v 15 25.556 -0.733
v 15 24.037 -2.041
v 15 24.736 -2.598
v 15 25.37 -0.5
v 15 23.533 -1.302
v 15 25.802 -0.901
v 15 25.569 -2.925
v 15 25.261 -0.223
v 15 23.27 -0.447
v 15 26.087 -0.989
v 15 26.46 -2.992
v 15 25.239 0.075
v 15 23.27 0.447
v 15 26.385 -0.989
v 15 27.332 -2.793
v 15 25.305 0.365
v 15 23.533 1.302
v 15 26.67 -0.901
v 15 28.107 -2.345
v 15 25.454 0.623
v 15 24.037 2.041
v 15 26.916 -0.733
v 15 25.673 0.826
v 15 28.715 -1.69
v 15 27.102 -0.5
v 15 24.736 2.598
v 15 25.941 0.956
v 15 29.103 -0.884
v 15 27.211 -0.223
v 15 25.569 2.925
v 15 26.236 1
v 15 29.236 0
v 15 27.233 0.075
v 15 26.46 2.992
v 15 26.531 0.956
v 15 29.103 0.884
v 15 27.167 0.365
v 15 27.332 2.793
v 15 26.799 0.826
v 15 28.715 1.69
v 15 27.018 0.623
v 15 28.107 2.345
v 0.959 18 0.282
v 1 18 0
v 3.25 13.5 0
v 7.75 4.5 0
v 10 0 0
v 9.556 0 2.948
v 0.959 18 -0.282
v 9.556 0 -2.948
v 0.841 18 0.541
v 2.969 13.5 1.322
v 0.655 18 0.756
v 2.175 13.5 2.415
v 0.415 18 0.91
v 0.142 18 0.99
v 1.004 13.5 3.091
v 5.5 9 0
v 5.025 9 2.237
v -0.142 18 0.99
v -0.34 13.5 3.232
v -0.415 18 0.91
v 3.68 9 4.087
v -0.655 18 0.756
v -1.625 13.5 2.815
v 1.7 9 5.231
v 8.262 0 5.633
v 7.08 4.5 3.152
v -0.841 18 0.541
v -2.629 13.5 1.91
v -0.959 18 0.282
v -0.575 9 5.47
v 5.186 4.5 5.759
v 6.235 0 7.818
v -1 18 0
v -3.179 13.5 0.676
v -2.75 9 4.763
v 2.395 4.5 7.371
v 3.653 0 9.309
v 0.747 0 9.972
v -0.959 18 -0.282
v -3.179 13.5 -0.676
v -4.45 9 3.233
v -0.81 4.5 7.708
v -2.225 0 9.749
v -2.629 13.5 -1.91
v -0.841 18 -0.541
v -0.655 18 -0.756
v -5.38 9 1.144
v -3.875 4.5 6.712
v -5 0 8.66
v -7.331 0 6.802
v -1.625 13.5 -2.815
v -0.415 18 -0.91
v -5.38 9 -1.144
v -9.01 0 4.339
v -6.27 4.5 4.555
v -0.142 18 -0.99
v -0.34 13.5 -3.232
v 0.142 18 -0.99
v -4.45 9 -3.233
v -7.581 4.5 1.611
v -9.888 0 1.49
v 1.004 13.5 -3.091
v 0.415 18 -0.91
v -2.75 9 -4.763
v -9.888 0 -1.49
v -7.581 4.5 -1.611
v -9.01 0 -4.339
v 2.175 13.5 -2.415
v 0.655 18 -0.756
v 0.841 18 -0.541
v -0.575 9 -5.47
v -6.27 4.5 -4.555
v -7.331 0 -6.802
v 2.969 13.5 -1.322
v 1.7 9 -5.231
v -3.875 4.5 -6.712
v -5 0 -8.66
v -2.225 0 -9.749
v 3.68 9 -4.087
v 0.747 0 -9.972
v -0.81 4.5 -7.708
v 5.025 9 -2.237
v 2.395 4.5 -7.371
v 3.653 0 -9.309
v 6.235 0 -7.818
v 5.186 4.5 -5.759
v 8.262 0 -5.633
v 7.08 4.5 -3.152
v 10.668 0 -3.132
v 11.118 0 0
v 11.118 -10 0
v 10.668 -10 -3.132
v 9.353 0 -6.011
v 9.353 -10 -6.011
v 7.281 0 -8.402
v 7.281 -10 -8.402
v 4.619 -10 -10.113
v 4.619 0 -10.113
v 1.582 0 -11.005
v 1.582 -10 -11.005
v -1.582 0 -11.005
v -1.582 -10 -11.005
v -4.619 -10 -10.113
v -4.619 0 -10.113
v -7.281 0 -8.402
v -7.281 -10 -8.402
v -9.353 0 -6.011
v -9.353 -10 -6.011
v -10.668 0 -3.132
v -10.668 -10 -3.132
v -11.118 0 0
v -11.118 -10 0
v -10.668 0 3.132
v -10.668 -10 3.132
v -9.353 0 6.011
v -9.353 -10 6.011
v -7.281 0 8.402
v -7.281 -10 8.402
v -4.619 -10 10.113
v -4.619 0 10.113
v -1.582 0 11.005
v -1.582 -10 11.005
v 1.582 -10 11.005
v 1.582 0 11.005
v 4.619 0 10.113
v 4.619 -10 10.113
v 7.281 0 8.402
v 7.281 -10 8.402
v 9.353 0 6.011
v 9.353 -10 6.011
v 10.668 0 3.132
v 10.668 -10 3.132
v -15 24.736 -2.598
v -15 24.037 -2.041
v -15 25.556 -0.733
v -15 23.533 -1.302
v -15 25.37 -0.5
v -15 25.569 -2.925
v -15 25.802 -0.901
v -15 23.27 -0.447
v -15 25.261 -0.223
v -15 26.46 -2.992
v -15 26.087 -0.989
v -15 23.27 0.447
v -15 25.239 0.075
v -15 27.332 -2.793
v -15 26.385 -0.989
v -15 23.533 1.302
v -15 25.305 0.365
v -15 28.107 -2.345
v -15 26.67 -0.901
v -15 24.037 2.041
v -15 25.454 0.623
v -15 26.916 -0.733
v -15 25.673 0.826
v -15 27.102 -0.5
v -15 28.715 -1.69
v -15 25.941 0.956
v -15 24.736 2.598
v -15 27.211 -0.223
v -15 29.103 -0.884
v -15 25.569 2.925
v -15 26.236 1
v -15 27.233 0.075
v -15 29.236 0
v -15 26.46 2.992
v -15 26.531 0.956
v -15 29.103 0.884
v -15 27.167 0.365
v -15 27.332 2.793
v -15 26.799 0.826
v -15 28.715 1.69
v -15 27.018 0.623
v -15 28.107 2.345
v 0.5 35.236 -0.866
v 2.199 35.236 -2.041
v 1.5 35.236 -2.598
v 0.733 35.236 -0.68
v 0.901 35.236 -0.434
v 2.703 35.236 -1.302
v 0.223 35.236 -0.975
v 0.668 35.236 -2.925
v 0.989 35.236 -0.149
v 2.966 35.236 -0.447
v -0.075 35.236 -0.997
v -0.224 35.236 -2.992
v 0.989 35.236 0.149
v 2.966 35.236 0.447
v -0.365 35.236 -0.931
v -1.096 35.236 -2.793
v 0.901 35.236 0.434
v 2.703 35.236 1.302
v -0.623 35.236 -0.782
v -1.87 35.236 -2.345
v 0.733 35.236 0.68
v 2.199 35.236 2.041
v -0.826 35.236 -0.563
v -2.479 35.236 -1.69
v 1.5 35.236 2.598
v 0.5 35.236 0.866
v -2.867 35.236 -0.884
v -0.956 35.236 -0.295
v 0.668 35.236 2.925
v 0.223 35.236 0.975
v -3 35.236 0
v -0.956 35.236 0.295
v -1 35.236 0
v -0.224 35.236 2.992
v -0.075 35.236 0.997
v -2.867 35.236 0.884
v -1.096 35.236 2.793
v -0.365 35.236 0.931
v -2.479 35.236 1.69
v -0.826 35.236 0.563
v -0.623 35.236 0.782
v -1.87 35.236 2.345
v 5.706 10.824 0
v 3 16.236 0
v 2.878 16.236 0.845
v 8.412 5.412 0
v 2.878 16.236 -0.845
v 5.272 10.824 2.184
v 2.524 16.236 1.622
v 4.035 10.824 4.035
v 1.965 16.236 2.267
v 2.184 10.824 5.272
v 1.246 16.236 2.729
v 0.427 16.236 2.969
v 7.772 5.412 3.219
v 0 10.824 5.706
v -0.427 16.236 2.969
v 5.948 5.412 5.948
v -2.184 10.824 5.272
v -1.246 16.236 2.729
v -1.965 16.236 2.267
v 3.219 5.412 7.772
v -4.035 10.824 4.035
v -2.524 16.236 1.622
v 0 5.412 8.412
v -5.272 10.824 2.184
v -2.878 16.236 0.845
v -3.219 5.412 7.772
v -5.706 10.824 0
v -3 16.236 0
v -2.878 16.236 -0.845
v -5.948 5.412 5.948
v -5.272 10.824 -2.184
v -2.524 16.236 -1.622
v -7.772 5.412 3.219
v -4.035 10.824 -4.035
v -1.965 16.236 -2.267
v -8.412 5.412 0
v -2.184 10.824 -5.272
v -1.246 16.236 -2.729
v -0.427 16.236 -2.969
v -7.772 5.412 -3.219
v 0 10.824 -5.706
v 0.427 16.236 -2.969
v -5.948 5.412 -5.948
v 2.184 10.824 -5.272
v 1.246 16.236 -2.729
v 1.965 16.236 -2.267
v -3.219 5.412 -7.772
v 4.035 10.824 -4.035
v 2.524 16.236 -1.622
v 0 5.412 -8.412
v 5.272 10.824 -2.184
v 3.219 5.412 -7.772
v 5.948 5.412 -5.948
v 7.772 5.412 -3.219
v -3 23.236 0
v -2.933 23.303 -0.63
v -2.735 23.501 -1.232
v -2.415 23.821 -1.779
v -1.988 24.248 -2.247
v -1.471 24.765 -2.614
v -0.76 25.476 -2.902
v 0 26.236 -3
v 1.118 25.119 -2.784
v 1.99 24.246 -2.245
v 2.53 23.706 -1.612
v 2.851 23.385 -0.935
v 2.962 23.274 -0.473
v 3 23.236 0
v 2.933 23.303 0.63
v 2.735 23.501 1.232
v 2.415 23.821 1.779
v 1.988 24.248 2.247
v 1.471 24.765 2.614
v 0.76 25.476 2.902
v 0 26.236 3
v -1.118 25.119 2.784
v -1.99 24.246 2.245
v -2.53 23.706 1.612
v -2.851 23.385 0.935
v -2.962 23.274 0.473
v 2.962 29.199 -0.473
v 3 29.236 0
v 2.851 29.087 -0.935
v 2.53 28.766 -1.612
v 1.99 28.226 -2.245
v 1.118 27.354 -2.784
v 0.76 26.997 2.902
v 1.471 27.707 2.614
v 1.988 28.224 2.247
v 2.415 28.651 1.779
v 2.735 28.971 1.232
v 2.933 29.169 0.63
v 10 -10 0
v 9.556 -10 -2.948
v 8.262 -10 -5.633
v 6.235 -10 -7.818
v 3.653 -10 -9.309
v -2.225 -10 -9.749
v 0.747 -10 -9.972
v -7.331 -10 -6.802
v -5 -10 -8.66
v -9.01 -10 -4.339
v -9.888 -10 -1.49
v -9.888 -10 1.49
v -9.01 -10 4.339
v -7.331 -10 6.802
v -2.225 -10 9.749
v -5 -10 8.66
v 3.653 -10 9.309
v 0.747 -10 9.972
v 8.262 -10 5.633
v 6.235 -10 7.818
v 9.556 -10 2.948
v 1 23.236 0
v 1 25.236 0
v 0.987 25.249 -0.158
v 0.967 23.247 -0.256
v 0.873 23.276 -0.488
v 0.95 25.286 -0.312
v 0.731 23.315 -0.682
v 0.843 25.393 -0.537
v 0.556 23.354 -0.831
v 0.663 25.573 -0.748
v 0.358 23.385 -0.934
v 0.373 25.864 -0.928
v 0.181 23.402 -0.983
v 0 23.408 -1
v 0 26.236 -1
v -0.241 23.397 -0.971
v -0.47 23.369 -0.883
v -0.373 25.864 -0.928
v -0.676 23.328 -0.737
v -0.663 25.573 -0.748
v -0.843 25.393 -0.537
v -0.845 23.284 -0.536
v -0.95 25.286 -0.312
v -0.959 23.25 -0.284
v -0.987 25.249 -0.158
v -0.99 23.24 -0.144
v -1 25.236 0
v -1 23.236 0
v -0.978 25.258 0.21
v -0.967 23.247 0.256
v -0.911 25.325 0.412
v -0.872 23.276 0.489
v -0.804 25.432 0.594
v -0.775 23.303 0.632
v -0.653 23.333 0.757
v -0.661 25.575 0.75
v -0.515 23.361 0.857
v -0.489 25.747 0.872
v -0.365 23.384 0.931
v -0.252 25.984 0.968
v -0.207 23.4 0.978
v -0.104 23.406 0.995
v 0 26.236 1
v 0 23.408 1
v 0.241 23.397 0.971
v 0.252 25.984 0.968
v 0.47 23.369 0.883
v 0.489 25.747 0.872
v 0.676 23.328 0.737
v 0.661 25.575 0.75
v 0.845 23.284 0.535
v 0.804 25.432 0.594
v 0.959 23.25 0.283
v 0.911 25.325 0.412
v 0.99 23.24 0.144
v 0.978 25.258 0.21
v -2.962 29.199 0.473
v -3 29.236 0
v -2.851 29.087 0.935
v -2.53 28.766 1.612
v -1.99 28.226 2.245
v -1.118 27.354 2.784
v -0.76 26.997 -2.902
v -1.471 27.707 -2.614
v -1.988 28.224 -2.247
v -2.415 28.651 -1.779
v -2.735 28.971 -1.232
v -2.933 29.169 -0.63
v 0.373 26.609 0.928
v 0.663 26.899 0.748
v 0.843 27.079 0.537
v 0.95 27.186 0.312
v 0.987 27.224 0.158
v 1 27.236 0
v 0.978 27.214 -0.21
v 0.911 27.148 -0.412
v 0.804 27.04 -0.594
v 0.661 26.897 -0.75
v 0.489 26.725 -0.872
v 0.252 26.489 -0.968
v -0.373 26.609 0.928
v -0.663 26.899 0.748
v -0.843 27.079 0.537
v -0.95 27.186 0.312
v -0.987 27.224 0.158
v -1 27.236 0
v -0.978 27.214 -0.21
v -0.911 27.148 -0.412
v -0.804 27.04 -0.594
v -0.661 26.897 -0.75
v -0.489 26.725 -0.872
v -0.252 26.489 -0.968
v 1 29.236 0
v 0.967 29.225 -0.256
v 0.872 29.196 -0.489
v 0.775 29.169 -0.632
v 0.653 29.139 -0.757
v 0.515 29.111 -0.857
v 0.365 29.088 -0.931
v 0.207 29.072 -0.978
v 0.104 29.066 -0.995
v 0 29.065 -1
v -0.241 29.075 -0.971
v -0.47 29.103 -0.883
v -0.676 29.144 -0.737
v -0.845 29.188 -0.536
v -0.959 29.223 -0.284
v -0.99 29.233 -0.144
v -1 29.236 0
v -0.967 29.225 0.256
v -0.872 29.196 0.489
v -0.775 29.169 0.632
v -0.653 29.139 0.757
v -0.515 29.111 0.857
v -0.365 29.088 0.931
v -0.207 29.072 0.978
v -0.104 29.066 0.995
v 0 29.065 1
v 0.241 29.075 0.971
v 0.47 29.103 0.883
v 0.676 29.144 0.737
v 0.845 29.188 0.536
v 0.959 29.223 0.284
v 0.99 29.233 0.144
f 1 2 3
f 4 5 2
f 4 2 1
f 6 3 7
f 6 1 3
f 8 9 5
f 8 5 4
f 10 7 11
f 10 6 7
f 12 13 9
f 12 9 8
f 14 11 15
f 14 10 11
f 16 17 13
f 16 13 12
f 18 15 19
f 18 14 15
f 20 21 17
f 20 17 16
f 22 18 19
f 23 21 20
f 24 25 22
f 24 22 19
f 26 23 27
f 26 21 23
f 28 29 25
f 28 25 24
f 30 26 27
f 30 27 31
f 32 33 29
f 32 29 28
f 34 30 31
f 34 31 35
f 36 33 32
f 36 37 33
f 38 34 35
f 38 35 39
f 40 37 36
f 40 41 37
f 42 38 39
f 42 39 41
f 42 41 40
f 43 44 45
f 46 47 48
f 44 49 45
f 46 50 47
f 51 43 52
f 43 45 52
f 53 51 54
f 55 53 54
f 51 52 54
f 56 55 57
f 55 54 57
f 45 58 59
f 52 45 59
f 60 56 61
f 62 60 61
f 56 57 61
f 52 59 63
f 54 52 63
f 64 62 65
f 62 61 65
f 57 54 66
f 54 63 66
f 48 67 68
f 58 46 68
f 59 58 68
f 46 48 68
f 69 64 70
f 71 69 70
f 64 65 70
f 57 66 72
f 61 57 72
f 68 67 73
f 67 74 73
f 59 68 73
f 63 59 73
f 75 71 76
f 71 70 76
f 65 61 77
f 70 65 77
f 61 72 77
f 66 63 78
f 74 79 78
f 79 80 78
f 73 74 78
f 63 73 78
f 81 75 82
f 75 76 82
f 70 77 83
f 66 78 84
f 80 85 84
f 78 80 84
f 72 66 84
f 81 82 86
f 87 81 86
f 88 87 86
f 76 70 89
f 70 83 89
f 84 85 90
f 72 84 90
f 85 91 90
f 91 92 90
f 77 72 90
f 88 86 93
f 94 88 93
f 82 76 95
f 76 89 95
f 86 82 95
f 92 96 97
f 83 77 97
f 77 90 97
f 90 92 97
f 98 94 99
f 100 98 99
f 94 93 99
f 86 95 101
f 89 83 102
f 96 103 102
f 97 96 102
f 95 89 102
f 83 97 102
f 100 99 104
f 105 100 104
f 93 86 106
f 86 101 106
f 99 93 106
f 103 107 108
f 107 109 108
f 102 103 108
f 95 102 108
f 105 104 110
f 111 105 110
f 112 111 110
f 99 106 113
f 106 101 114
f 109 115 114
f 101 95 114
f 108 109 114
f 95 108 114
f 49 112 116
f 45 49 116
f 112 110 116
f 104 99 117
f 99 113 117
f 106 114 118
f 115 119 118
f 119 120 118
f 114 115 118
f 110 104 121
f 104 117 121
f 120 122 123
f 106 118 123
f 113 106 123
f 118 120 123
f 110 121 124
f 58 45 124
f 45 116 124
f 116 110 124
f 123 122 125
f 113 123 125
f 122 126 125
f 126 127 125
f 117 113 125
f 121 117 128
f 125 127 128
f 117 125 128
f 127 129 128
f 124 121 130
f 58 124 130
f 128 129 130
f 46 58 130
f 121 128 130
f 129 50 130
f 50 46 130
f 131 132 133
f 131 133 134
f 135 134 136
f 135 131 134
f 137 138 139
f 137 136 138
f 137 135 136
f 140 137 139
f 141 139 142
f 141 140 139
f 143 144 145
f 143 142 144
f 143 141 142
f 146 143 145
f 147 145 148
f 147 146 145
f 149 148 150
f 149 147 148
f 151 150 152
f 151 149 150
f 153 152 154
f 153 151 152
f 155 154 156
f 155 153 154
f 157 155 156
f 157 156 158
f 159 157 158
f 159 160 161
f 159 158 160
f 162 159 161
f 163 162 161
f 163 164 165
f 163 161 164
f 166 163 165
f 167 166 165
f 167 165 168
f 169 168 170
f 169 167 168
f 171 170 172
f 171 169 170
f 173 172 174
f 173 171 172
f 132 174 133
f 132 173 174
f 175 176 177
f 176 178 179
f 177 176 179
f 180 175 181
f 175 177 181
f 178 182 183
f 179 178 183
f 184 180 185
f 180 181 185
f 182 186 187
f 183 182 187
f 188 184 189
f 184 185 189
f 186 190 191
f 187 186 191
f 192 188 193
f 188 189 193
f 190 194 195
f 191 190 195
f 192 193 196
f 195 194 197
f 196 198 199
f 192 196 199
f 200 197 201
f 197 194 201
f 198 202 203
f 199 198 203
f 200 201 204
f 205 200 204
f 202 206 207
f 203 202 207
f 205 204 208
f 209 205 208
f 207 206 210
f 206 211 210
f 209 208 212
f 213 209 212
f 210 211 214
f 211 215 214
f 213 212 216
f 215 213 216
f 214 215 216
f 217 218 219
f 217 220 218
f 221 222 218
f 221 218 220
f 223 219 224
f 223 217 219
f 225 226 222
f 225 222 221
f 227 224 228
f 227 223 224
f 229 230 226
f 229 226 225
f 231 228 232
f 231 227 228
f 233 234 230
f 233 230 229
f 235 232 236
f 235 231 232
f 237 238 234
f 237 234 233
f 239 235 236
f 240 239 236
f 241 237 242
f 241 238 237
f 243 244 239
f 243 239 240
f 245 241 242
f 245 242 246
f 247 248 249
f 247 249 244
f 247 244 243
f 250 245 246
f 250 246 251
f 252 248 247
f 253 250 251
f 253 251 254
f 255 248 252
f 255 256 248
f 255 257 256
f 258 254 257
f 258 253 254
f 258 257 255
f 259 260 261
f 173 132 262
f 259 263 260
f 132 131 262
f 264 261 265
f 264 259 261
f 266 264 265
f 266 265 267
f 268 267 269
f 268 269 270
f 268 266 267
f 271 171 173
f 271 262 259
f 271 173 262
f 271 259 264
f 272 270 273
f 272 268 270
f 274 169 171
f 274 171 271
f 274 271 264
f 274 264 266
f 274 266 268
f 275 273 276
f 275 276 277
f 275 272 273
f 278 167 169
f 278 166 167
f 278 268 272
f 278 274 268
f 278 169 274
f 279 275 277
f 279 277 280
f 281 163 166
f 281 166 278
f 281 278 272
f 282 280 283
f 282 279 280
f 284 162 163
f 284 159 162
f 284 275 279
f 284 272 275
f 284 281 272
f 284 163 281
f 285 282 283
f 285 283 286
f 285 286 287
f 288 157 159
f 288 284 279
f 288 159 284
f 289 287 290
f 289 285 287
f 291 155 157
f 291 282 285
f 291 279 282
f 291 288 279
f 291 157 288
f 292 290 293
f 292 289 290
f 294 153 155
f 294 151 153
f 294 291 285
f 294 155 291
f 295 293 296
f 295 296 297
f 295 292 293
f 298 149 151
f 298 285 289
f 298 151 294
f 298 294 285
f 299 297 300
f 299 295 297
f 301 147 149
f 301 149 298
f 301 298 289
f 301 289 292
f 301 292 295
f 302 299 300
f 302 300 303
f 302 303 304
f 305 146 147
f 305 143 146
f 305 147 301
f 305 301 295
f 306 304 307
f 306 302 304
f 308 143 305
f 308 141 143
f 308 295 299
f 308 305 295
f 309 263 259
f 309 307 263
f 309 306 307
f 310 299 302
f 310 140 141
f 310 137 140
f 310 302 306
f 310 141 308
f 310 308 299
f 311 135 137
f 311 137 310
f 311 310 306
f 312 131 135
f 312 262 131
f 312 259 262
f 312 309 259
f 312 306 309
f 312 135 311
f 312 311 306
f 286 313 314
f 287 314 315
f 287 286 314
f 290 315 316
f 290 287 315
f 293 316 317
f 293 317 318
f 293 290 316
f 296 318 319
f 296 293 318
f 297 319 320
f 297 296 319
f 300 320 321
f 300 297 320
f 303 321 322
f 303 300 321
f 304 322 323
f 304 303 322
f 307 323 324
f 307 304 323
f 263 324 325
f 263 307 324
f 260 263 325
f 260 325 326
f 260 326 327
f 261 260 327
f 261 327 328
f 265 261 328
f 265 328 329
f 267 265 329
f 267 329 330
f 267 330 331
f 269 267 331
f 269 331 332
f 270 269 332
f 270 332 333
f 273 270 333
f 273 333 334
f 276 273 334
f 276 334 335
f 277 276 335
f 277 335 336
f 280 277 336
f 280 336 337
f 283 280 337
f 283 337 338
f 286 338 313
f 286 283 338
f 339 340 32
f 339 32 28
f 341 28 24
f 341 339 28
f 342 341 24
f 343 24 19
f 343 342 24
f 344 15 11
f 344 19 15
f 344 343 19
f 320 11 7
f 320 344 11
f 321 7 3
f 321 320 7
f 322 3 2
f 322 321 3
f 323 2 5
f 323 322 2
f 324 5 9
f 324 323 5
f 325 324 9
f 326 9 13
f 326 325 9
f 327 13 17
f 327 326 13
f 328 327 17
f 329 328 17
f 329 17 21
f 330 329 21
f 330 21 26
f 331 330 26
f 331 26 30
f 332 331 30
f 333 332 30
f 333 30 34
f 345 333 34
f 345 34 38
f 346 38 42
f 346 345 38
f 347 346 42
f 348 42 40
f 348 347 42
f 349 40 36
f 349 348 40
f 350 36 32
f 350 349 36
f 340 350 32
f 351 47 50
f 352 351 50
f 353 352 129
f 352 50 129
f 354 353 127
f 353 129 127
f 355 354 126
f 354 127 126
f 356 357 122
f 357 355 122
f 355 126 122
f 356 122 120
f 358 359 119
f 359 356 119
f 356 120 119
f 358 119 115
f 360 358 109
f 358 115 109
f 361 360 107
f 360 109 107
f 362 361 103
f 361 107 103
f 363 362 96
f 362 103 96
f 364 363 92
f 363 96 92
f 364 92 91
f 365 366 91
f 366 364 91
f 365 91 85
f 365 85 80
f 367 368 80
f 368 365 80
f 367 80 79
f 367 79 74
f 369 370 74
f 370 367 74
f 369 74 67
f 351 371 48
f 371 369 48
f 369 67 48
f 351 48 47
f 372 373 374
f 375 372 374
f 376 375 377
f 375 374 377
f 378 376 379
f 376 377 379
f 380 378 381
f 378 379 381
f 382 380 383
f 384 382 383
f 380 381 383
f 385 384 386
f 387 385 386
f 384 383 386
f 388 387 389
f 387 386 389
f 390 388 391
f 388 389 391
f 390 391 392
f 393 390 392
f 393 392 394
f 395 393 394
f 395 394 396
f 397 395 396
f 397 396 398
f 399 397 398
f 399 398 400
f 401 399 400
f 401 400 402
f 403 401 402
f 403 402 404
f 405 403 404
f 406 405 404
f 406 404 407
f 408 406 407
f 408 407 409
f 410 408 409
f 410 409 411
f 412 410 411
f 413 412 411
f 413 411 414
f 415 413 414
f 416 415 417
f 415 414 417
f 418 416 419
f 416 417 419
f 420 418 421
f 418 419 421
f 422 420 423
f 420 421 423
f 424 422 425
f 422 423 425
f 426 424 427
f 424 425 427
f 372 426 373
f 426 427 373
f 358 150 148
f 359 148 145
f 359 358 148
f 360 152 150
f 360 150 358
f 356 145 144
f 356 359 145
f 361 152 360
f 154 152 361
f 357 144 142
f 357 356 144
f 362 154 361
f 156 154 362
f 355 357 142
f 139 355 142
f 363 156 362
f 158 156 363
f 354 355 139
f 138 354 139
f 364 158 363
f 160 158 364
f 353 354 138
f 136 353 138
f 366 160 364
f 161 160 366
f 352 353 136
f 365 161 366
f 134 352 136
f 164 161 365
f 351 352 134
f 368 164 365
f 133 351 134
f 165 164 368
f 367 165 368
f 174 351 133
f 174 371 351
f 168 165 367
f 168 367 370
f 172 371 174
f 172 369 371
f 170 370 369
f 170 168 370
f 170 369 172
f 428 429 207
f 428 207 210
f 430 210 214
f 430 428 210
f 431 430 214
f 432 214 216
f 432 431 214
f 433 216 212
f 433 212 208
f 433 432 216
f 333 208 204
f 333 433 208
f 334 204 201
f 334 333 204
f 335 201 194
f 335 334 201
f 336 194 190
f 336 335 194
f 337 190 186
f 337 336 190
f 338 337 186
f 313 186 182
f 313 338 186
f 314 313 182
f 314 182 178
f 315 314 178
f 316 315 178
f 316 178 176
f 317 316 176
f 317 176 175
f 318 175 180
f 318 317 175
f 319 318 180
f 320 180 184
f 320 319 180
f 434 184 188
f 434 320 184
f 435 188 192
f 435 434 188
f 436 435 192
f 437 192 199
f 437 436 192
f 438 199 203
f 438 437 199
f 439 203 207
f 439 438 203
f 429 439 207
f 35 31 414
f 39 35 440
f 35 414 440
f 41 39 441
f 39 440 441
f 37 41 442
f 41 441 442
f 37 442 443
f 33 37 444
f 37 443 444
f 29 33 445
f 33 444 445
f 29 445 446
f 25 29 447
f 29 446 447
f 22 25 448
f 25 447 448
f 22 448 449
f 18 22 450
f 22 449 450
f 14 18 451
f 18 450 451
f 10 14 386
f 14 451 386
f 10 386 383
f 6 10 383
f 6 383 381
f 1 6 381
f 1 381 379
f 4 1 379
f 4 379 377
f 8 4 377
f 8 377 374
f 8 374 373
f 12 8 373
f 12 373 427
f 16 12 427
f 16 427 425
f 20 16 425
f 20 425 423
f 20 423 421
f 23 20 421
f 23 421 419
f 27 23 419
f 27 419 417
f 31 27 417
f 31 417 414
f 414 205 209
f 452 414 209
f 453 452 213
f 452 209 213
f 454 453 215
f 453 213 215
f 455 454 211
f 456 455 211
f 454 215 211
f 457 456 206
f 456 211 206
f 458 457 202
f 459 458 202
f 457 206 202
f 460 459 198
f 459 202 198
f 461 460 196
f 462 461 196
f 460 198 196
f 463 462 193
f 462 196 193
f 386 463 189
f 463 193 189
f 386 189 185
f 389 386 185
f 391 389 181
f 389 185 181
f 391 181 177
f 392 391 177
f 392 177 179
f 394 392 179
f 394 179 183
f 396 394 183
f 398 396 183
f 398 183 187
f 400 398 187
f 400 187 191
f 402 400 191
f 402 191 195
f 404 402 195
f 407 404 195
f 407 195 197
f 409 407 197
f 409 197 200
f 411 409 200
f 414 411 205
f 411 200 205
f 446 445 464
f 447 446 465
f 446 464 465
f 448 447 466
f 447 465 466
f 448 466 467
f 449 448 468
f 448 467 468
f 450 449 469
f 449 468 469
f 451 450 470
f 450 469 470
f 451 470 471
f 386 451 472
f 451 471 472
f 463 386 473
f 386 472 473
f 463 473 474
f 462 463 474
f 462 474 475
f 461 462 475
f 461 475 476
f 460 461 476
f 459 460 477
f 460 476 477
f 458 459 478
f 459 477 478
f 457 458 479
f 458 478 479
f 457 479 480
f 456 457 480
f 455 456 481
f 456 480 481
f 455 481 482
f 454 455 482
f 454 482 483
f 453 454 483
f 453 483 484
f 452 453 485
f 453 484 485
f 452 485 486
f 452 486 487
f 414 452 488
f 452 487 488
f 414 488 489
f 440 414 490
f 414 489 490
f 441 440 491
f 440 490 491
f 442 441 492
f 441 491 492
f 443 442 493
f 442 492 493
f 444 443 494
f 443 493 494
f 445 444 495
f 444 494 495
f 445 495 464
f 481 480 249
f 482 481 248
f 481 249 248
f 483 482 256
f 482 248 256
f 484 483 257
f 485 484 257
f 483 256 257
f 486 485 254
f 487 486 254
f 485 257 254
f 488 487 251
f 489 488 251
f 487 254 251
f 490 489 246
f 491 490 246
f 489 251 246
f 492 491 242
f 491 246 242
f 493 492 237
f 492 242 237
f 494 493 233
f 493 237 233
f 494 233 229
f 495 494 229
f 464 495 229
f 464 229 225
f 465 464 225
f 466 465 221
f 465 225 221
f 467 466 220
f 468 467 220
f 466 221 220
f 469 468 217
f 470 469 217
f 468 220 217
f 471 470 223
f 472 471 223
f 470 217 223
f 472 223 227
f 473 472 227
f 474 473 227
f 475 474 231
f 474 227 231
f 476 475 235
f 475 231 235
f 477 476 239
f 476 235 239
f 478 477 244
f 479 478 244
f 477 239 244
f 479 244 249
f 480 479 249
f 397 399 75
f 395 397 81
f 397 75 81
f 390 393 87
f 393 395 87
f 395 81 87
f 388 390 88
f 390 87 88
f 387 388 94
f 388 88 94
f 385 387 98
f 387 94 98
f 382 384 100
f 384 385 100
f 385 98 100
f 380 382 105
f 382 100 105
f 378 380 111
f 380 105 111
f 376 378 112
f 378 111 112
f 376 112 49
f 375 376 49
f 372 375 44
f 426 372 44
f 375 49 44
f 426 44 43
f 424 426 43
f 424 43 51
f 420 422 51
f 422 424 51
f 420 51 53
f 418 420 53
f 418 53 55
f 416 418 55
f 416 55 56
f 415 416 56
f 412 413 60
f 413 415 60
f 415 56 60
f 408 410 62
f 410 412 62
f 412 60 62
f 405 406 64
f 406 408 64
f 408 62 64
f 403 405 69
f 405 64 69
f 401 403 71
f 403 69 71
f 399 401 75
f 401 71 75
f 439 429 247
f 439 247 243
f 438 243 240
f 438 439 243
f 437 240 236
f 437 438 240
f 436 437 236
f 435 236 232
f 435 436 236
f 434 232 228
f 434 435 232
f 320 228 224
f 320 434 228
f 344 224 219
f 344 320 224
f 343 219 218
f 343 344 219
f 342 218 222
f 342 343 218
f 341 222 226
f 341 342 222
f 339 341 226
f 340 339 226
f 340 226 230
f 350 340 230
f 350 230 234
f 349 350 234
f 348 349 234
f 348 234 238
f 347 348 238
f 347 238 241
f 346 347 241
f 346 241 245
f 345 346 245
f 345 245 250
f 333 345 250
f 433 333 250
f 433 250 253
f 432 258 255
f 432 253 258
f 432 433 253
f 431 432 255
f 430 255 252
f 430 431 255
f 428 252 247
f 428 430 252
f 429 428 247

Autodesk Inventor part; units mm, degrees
ref_plane "YZ Plane" through (0, 0, 0) normal (1, 0, 0) x (0, 1, 0)
ref_plane "XZ Plane" through (0, 0, 0) normal (0, 1, 0) x (-1, 0, 0)
ref_plane "XY Plane" through (0, 0, 0) normal (0, 0, 1) x (1, 0, 0)
sketch "Sketch2" plane through (0, 0, 0) normal (0, 0, 1) x (1, 0, 0)
  line L0 (0, 0) -> (10, 0)
  line L1 (10, 0) -> (0, 20)
  line L2 (0, 20) -> (0, 0)
  line L3 (0, 20) -> (0, 22.2361)
  line L4 (0, 22.2361) -> (11.118, 0)
  line L5 (10, 0) -> (11.118, 0)
  dimension "d4" = 20
  dimension "d8" = 1
  dimension "d9" = 10
revolve "Revolution1" add sketch "Sketch2" angle 360 about axis through (0, 20, 0) along (0, -1, 0) contours L1 L3 L4 L5
sketch "Sketch5" plane through (0, 0, 0) normal (0, -1, 0) x (1, 0, 0)
  circle A0 centre (0, 0) radius 10
  circle A1 centre (0, 0) radius 11.118
  circle A2 centre (0, 0) radius 11.118 projected
  dimension "d11" = 20
extrude "Extrusion2" add sketch "Sketch5" along normal blind 10
sketch "Sketch7" plane through (0, 0, 0) normal (0, 1, 0) x (-1, 0, 0)
  circle A0 centre (0, 0) radius 1
  dimension "d14" = 2
extrude "Extrusion3" cut sketch "Sketch7" along normal up to surface
sketch "Sketch8" plane through (0, 0, 0) normal (0, 0, 1) x (1, 0, 0)
  line L0 (-1, 20.2361) -> (1, 20.2361) projected
  line L1 (-1, 20.2361) -> (-1, 35.2361)
  line L2 (-1, 35.2361) -> (-3, 35.2361)
  line L3 (-3, 35.2361) -> (-3, 15.9471)
  line L4 (-3, 15.9471) -> (-1, 20.2361)
  line L5 (0, 20.2361) -> (0, 25.2361)
  point P0 (0, 0)
  dimension "d17" = 115
  dimension "d18" = 2
  dimension "d20" = 15
revolve "Revolution2" add sketch "Sketch8" angle 360 about axis through (0, 20.2361, 0) along (0, 1, 0)
sketch "Sketch9" plane through (0, 0, 0) normal (1, 0, 0) x (0, 1, 0)
  circle A0 centre (26.2361, 0) radius 3
  line L0 (16.2361, 3) -> (16.2361, -3) projected
  point P0 (0, 0)
  dimension "d22" = 6
  dimension "d23" = 10
extrude "Extrusion4" add sketch "Sketch9" along normal mid plane 30
sketch "Sketch10" plane through (-15, 26.2361, 0) normal (-1, 0, 0) x (0, 0, 1)
  circle A0 centre (0, 0) radius 1
  circle A1 centre (0, 0) radius 3 projected
  point P0 (0, -26.2361)
  dimension "d26" = 2
extrude "Extrusion5" cut sketch "Sketch10" against normal up to surface (30 mm away) contours A0
thread "Thread1" size "M6x1" class "6g" standard "ANSI Metric M Profile" length 7.15
thread "Thread2" size "M6x1" class "6g" standard "ANSI Metric M Profile" length 9
thread "Thread3" size "M6x1" class "6g" standard "ANSI Metric M Profile" length 9
sketch "Sketch11" plane through (0, 35.2361, 0) normal (0, 1, 0) x (1, 0, 0)
  circle A0 centre (0, 0) radius 1
extrude "Extrusion6" cut sketch "Sketch11" against normal blind 20
properties part number "Chemmix"
